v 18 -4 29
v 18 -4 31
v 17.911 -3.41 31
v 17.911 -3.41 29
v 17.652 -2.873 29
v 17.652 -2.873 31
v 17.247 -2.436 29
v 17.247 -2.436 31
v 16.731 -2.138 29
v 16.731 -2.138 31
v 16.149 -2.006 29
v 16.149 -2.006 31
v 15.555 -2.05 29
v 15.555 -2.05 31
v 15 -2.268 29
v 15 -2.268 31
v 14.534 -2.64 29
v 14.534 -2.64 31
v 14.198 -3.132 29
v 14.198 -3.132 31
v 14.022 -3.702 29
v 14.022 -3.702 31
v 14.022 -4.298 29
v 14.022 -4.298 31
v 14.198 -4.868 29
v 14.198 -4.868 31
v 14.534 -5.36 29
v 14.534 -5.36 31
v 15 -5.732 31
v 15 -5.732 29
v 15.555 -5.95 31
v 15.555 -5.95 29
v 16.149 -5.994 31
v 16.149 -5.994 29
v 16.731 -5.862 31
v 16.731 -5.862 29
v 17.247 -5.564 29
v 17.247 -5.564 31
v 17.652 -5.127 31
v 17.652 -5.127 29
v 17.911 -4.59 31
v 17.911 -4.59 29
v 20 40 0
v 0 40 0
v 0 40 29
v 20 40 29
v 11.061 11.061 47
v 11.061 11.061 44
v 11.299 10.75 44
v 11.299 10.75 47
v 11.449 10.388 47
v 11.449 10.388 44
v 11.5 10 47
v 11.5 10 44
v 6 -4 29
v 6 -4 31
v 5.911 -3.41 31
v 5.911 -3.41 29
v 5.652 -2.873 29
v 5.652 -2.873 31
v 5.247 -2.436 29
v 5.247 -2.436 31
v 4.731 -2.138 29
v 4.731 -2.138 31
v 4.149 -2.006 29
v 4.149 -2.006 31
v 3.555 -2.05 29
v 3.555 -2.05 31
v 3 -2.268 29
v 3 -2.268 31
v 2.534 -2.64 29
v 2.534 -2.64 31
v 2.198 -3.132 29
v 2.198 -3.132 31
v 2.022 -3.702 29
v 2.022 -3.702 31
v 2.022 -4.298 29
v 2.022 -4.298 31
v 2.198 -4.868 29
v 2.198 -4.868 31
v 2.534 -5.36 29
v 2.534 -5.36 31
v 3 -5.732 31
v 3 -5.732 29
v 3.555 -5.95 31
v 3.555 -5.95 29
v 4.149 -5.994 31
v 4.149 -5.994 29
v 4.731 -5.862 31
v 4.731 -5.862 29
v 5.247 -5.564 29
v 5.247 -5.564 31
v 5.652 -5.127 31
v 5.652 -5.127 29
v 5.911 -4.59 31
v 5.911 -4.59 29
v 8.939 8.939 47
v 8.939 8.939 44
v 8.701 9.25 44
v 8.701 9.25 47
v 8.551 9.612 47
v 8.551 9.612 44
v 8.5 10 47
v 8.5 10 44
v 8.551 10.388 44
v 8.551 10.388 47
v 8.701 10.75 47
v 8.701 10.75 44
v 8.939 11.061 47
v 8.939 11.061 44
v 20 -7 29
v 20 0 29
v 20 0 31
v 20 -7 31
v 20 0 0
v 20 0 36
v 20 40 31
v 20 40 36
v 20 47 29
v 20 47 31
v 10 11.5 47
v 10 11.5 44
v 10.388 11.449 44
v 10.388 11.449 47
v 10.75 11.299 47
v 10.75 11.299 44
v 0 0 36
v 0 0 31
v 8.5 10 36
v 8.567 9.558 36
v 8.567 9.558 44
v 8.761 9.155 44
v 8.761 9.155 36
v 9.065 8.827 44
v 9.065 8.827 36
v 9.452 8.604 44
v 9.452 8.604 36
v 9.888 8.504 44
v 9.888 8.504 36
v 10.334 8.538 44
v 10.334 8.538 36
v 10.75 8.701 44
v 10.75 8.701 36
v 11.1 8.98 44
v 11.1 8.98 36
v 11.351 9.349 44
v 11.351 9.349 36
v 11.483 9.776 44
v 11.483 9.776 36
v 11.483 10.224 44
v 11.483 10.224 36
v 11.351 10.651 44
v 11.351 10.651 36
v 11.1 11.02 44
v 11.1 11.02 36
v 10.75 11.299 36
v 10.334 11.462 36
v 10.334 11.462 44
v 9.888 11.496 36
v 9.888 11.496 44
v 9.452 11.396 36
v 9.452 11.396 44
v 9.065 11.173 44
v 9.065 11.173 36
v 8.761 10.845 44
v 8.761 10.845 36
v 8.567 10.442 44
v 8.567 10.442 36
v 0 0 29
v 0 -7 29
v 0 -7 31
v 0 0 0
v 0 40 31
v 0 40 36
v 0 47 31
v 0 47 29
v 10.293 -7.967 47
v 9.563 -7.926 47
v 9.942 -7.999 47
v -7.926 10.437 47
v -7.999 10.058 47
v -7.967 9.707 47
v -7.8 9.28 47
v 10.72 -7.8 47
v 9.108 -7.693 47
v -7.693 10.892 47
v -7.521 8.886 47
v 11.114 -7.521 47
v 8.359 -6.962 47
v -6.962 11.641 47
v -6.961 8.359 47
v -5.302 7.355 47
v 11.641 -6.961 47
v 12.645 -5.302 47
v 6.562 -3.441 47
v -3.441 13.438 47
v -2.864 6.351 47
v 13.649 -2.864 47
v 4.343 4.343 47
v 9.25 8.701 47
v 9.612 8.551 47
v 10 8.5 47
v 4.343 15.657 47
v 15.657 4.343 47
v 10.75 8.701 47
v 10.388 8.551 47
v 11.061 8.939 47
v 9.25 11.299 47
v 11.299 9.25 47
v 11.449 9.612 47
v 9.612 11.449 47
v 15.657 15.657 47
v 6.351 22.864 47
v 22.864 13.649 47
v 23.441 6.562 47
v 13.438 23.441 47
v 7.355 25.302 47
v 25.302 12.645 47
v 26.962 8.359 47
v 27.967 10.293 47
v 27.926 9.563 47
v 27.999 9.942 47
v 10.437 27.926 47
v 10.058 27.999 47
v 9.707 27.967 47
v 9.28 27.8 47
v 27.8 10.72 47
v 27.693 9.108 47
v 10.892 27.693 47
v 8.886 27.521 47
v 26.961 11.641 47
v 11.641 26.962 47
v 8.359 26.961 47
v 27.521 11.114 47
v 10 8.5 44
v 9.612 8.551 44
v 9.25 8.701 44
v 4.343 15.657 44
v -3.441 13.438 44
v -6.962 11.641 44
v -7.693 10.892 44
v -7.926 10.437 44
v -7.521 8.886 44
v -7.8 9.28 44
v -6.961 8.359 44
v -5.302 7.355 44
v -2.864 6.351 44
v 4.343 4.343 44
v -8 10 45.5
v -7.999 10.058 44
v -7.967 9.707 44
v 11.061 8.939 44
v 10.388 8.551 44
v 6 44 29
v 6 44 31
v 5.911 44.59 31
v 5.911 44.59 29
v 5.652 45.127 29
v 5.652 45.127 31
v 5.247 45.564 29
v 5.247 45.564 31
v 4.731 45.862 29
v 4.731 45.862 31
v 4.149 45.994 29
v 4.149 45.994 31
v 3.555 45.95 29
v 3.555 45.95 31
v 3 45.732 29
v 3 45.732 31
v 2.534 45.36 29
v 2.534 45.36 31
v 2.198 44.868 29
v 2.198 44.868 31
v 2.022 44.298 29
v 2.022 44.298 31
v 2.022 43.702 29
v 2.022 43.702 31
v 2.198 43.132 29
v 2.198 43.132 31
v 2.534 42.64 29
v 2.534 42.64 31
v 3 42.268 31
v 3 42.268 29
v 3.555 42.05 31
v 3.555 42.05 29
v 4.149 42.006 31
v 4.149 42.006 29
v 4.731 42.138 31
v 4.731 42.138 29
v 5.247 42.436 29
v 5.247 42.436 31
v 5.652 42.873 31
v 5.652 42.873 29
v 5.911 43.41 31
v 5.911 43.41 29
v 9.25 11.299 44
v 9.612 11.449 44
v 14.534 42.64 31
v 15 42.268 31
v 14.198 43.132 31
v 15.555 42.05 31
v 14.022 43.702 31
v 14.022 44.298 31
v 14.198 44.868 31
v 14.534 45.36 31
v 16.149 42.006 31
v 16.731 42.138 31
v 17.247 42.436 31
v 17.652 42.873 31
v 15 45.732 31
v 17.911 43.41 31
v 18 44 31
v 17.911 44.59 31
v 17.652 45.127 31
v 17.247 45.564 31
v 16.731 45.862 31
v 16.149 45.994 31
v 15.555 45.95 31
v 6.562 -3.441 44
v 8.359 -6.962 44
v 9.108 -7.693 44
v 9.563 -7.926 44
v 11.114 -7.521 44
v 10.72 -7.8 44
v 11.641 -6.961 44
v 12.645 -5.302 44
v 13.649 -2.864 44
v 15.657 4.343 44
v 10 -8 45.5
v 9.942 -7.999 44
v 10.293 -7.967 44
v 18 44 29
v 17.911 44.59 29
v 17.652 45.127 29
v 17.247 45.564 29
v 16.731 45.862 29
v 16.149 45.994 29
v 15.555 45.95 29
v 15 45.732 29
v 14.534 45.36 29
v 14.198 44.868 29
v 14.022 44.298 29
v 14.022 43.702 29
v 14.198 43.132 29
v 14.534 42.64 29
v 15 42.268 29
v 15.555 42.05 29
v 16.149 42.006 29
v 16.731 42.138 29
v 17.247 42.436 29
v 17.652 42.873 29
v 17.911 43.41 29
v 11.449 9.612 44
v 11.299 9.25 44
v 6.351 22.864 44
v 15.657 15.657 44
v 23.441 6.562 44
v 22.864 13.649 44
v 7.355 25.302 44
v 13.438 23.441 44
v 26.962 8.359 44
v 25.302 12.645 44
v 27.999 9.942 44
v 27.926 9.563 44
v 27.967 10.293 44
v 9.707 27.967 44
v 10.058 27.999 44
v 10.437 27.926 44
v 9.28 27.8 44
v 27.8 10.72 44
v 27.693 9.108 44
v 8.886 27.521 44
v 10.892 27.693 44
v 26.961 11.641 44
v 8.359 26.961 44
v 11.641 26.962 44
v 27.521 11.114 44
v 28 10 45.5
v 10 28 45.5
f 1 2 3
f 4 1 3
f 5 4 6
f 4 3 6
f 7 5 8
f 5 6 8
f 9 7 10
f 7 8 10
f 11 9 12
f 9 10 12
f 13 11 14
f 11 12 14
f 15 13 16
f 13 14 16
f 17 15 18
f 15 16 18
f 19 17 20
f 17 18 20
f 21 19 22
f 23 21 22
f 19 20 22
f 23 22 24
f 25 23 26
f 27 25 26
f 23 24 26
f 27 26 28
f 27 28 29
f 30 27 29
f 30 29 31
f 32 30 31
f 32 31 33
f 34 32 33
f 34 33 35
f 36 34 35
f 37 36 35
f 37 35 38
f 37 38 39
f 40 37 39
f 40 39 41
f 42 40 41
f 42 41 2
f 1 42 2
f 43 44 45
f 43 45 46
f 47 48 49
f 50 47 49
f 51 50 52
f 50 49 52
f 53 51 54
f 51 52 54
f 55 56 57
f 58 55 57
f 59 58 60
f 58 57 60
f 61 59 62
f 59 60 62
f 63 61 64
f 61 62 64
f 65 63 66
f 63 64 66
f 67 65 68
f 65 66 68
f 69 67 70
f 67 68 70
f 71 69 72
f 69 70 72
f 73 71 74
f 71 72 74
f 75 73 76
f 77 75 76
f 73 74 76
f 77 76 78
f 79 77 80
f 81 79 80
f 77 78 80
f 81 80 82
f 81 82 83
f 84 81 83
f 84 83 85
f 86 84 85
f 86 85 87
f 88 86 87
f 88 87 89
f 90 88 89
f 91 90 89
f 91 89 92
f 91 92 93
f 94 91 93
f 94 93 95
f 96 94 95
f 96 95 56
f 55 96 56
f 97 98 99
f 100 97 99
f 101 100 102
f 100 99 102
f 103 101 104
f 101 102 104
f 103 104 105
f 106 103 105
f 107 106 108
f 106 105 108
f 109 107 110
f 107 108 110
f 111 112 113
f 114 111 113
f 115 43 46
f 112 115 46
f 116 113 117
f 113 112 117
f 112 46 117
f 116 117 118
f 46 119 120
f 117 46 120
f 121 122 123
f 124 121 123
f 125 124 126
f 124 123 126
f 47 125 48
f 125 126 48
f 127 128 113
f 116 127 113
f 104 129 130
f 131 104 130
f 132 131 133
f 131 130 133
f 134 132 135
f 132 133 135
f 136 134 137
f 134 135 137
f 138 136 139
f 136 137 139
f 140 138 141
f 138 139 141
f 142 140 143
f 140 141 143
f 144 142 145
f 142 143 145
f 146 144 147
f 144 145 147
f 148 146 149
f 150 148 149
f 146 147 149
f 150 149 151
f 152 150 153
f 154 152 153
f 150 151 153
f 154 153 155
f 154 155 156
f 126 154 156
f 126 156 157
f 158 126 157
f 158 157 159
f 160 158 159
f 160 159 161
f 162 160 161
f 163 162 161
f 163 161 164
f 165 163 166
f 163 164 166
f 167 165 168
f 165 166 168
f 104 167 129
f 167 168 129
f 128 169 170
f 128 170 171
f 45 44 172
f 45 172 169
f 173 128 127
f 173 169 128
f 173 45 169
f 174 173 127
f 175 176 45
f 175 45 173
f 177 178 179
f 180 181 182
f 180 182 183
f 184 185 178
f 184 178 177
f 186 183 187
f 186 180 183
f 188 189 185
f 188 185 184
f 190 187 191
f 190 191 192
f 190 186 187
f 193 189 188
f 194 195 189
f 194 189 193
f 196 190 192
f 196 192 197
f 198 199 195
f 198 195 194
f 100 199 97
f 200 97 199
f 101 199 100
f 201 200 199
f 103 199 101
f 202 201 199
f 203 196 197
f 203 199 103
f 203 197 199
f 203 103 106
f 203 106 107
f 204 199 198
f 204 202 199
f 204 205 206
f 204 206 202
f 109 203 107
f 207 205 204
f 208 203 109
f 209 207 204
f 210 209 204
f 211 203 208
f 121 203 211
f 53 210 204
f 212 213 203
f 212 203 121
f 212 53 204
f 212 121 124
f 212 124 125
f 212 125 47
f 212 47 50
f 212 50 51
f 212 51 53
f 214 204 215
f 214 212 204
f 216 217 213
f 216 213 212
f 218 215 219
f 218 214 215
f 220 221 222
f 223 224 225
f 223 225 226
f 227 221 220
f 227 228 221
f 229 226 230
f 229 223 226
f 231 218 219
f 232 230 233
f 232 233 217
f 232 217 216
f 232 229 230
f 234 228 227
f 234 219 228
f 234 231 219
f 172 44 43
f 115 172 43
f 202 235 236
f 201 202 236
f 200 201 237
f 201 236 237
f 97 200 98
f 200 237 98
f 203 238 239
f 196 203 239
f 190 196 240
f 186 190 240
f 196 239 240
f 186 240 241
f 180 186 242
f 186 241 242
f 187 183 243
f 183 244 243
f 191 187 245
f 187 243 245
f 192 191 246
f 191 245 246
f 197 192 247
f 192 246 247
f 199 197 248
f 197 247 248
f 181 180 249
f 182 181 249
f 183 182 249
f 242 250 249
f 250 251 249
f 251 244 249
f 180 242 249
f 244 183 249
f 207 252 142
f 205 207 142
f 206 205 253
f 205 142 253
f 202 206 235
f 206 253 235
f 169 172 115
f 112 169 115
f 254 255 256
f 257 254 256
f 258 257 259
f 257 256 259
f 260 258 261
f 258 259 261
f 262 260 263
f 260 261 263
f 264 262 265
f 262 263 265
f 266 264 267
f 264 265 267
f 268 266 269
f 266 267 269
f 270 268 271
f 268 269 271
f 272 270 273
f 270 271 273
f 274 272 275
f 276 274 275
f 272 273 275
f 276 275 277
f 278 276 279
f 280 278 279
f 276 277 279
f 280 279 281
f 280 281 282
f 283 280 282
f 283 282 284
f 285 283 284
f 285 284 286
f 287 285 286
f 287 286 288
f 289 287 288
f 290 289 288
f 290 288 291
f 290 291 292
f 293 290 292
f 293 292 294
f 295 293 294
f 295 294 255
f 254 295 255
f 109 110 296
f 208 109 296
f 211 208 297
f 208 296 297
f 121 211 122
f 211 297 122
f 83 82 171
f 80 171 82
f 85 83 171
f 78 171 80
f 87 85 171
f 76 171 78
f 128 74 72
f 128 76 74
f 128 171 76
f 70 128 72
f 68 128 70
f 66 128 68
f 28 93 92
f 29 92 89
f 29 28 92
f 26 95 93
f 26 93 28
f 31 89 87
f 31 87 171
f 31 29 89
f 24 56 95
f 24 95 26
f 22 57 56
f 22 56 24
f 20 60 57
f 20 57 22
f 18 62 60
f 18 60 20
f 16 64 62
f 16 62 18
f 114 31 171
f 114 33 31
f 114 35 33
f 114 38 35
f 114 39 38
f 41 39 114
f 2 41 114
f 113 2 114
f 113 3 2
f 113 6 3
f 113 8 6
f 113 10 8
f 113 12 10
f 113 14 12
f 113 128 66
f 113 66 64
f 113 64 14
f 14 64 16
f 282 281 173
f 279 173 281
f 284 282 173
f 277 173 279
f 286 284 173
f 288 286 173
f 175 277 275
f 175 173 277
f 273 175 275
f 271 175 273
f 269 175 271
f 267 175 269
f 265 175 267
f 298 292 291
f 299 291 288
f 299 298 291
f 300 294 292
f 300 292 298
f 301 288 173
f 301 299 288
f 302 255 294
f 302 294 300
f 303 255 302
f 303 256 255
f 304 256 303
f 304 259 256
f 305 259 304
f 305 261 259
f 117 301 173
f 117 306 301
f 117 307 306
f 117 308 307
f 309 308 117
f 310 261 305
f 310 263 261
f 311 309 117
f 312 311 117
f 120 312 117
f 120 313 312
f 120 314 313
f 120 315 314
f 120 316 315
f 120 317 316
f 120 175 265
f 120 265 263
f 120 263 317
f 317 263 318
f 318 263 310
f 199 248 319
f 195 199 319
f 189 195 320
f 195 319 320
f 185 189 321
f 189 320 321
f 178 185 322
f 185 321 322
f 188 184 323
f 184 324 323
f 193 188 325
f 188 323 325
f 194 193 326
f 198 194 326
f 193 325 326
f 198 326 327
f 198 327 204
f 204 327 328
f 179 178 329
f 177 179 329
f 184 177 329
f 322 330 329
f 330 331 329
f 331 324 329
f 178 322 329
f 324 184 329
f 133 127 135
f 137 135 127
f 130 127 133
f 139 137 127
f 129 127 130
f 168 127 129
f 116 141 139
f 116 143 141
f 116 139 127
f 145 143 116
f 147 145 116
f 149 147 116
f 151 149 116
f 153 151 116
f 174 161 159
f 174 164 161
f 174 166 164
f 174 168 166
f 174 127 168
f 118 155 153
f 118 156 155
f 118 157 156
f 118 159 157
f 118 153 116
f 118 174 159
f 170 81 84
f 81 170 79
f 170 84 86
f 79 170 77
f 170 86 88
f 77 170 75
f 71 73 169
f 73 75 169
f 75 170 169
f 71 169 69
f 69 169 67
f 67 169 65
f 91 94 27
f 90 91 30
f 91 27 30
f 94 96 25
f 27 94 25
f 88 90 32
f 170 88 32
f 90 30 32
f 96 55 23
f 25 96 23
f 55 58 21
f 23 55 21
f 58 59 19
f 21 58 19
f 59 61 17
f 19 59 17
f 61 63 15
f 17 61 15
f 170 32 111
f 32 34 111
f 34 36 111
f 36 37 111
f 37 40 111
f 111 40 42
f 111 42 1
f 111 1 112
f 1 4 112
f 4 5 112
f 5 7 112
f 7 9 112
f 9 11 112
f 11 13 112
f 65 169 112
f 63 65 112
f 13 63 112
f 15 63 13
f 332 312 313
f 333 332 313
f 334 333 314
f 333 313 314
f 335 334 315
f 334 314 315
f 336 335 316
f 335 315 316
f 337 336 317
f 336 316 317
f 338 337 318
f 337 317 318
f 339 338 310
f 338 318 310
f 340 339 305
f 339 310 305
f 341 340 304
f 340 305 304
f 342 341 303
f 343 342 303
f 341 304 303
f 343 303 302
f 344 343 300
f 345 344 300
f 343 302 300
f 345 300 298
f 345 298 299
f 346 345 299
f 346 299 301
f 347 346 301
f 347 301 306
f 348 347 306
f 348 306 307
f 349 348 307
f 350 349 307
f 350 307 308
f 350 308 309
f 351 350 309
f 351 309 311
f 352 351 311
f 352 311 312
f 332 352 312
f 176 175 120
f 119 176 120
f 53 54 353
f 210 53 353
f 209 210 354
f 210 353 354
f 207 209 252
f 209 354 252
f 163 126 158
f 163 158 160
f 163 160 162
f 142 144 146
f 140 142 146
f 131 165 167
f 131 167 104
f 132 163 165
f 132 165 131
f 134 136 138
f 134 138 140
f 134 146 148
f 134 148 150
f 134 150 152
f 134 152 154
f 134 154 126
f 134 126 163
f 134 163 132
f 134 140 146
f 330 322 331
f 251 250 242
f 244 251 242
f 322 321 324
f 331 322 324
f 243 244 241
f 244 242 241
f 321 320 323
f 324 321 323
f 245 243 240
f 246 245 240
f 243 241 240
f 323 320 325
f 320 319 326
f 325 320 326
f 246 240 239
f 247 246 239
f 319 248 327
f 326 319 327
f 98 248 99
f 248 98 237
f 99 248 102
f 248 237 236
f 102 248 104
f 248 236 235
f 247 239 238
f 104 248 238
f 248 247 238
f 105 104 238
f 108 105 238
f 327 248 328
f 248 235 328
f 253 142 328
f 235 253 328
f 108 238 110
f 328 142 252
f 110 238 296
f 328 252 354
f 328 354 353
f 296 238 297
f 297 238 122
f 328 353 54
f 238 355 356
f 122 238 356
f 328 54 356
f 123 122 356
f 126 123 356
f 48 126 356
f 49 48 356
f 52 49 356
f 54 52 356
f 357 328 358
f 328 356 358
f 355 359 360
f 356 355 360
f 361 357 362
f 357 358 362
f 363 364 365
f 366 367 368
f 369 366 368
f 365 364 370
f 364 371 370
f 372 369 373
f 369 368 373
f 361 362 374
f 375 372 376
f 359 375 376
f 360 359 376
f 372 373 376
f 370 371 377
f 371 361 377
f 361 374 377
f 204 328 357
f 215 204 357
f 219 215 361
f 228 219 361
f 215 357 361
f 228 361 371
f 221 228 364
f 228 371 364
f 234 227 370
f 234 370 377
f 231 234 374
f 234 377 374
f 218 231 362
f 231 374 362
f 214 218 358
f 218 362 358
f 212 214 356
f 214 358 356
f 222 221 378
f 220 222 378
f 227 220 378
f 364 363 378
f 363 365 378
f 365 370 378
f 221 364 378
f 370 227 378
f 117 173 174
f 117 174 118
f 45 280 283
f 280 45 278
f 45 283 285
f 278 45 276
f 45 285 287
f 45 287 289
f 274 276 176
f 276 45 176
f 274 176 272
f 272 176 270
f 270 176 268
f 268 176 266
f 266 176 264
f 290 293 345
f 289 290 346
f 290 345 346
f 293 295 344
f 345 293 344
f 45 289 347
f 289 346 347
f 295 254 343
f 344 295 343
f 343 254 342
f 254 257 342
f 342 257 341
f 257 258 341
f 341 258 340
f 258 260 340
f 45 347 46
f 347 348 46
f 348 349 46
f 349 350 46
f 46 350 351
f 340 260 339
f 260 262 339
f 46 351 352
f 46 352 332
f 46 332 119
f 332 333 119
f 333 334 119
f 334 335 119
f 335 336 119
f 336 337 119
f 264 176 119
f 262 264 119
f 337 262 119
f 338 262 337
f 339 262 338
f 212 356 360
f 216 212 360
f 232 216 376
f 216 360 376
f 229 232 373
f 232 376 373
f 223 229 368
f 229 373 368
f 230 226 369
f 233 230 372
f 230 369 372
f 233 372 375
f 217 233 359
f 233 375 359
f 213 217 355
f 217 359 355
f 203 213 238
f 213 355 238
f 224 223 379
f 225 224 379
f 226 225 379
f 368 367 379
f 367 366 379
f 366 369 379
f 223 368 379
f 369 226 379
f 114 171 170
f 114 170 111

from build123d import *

# Parameters (mm, degrees)
SKETCH_1_W           = 20
SKETCH_1_H           = 40
EXTRUDE_1_DEPTH      = 36
EXTRUDE_2_DEPTH      = 7
EXTRUDE_2_DEPTH_BACK = 47
SKETCH_2_W           = 20
SKETCH_2_H           = 2
CUT_EXTRUDE_1_REACH  = 61.749
SKETCH_3_R           = 2
SKETCH_4_R           = 1.5
EXTRUDE_3_DEPTH      = 8
EXTRUDE_4_DEPTH      = 3


with BuildPart() as part:
    # 草图1 → 凸台-拉伸1 (new body)
    with BuildSketch(Plane.XY):
        with Locations((10, 20)):
            Rectangle(SKETCH_1_W, SKETCH_1_H)
    extrude(amount=EXTRUDE_1_DEPTH)

    # 草图2 → 凸台-拉伸2 (add, two sides: drawn at the far end of the back side and taken through both)
    with BuildSketch(Plane.XZ.offset(-EXTRUDE_2_DEPTH_BACK)):
        with Locations((10, 30)):
            Rectangle(SKETCH_2_W, SKETCH_2_H)
    extrude(amount=EXTRUDE_2_DEPTH + EXTRUDE_2_DEPTH_BACK)

    # 草图3 → 切除-拉伸1 (cut, up to next)
    with BuildSketch(Plane.XY.offset(31), mode=Mode.PRIVATE) as cut_extrude_1_sk1:
        with Locations((4, -4)):
            Circle(SKETCH_3_R)
    cut_extrude_1_tool1 = extrude(cut_extrude_1_sk1.sketch, amount=-CUT_EXTRUDE_1_REACH, mode=Mode.PRIVATE) & part.part
    # 草图3 → 切除-拉伸1 (cut, up to next)
    with BuildSketch(Plane.XY.offset(31), mode=Mode.PRIVATE) as cut_extrude_1_sk2:
        with Locations((16, -4)):
            Circle(SKETCH_3_R)
    cut_extrude_1_tool2 = extrude(cut_extrude_1_sk2.sketch, amount=-CUT_EXTRUDE_1_REACH, mode=Mode.PRIVATE) & part.part
    # 草图3 → 切除-拉伸1 (cut, up to next)
    with BuildSketch(Plane.XY.offset(31), mode=Mode.PRIVATE) as cut_extrude_1_sk3:
        with Locations((4, 44)):
            Circle(SKETCH_3_R)
    cut_extrude_1_tool3 = extrude(cut_extrude_1_sk3.sketch, amount=-CUT_EXTRUDE_1_REACH, mode=Mode.PRIVATE) & part.part
    # 草图3 → 切除-拉伸1 (cut, up to next)
    with BuildSketch(Plane.XY.offset(31), mode=Mode.PRIVATE) as cut_extrude_1_sk4:
        with Locations((16, 44)):
            Circle(SKETCH_3_R)
    cut_extrude_1_tool4 = extrude(cut_extrude_1_sk4.sketch, amount=-CUT_EXTRUDE_1_REACH, mode=Mode.PRIVATE) & part.part
    add(cut_extrude_1_tool1.solids().sort_by_distance((4, -4, 31))[0], mode=Mode.SUBTRACT)
    add(cut_extrude_1_tool2.solids().sort_by_distance((16, -4, 31))[0], mode=Mode.SUBTRACT)
    add(cut_extrude_1_tool3.solids().sort_by_distance((4, 44, 31))[0], mode=Mode.SUBTRACT)
    add(cut_extrude_1_tool4.solids().sort_by_distance((16, 44, 31))[0], mode=Mode.SUBTRACT)

    # 草图4 → 凸台-拉伸3 (add)
    with BuildSketch(Plane.XY.offset(36)):
        with Locations(Location((10, 10, 0), (0, 0, 180))):
            Circle(SKETCH_4_R)
    extrude(amount=EXTRUDE_3_DEPTH)


with BuildPart() as body_2:
    # 草图5 → 凸台-拉伸4 (new body)
    with BuildSketch(Plane.XY.offset(44)):
        with BuildLine():
            add(Edge.make_bspline(
                [(10, -8), (12.828427125, -8), (15.656854249, 4.343145751)],
                knots=[0.5, 0.5, 0.5, 1, 1, 1], degree=2))
            ThreePointArc((15.656854249, 4.343145751), (13.061467459, 2.60896374), (10, 2))
            Line((10, 2), (10, -8))
        make_face()
        with BuildLine():
            Line((10, -8), (10, 2))
            ThreePointArc((10, 2), (6.938532541, 2.60896374), (4.343145751, 4.343145751))
            add(Edge.make_bspline(
                [(4.343145751, 4.343145751), (7.171572875, -8), (10, -8)],
                knots=[0, 0, 0, 0.5, 0.5, 0.5], degree=2))
        make_face()
        with BuildLine():
            Line((18, 10), (11.5, 10))
            ThreePointArc((11.5, 10), (11.385819299, 9.425974851), (11.060660172, 8.939339828))
            Line((11.060660172, 8.939339828), (15.656854249, 4.343145751))
            ThreePointArc((15.656854249, 4.343145751), (17.39103626, 6.938532541), (18, 10))
        make_face()
        with BuildLine():
            add(Edge.make_bspline(
                [(28, 10), (28, 12.828427125), (15.656854249, 15.656854249)],
                knots=[0.5, 0.5, 0.5, 1, 1, 1], degree=2))
            ThreePointArc((15.656854249, 15.656854249), (17.39103626, 13.061467459), (18, 10))
            Line((18, 10), (28, 10))
        make_face()
        with BuildLine():
            Line((28, 10), (18, 10))
            ThreePointArc((18, 10), (17.39103626, 6.938532541), (15.656854249, 4.343145751))
            add(Edge.make_bspline(
                [(15.656854249, 4.343145751), (28, 7.171572875), (28, 10)],
                knots=[0, 0, 0, 0.5, 0.5, 0.5], degree=2))
        make_face()
        with BuildLine():
            Line((15.656854249, 15.656854249), (11.060660172, 11.060660172))
            ThreePointArc((11.060660172, 11.060660172), (11.385819299, 10.574025149), (11.5, 10))
            Line((11.5, 10), (18, 10))
            ThreePointArc((18, 10), (17.39103626, 13.061467459), (15.656854249, 15.656854249))
        make_face()
        with BuildLine():
            Line((10, 18), (10, 11.5))
            ThreePointArc((10, 11.5), (10.574025149, 11.385819299), (11.060660172, 11.060660172))
            Line((11.060660172, 11.060660172), (15.656854249, 15.656854249))
            ThreePointArc((15.656854249, 15.656854249), (13.061467459, 17.39103626), (10, 18))
        make_face()
        with BuildLine():
            add(Edge.make_bspline(
                [(4.343145751, 15.656854249), (7.171572875, 28), (10, 28)],
                knots=[0, 0, 0, 0.5, 0.5, 0.5], degree=2))
            ThreePointArc((4.343145751, 15.656854249), (6.938532541, 17.39103626), (10, 18))
            Line((10, 18), (10, 28))
        make_face()
        with BuildLine():
            Line((10, 28), (10, 18))
            ThreePointArc((10, 18), (13.061467459, 17.39103626), (15.656854249, 15.656854249))
            add(Edge.make_bspline(
                [(10, 28), (12.828427125, 28), (15.656854249, 15.656854249)],
                knots=[0.5, 0.5, 0.5, 1, 1, 1], degree=2))
        make_face()
        with BuildLine():
            Line((4.343145751, 15.656854249), (8.939339828, 11.060660172))
            ThreePointArc((8.939339828, 11.060660172), (9.425974851, 11.385819299), (10, 11.5))
            Line((10, 11.5), (10, 18))
            ThreePointArc((10, 18), (6.938532541, 17.39103626), (4.343145751, 15.656854249))
        make_face()
        with BuildLine():
            Line((2, 10), (8.5, 10))
            ThreePointArc((8.5, 10), (8.614180701, 10.574025149), (8.939339828, 11.060660172))
            Line((8.939339828, 11.060660172), (4.343145751, 15.656854249))
            ThreePointArc((4.343145751, 15.656854249), (2.60896374, 13.061467459), (2, 10))
        make_face()
        with BuildLine():
            ThreePointArc((4.343145751, 4.343145751), (2.60896374, 6.938532541), (2, 10))
            Line((2, 10), (-8, 10))
            add(Edge.make_bspline(
                [(4.343145751, 4.343145751), (-8, 7.171572875), (-8, 10)],
                knots=[0, 0, 0, 0.5, 0.5, 0.5], degree=2))
        make_face()
        with BuildLine():
            Line((-8, 10), (2, 10))
            ThreePointArc((2, 10), (2.60896374, 13.061467459), (4.343145751, 15.656854249))
            add(Edge.make_bspline(
                [(-8, 10), (-8, 12.828427125), (4.343145751, 15.656854249)],
                knots=[0.5, 0.5, 0.5, 1, 1, 1], degree=2))
        make_face()
        with BuildLine():
            ThreePointArc((8.939339828, 8.939339828), (8.614180701, 9.425974851), (8.5, 10))
            Line((8.5, 10), (2, 10))
            ThreePointArc((2, 10), (2.60896374, 6.938532541), (4.343145751, 4.343145751))
            Line((4.343145751, 4.343145751), (8.939339828, 8.939339828))
        make_face()
        with BuildLine():
            Line((10, 2), (10, 8.5))
            ThreePointArc((10, 8.5), (9.425974851, 8.614180701), (8.939339828, 8.939339828))
            Line((8.939339828, 8.939339828), (4.343145751, 4.343145751))
            ThreePointArc((4.343145751, 4.343145751), (6.938532541, 2.60896374), (10, 2))
        make_face()
        with BuildLine():
            Line((15.656854249, 4.343145751), (11.060660172, 8.939339828))
            ThreePointArc((11.060660172, 8.939339828), (10.574025149, 8.614180701), (10, 8.5))
            Line((10, 8.5), (10, 2))
            ThreePointArc((10, 2), (13.061467459, 2.60896374), (15.656854249, 4.343145751))
        make_face()
    extrude(amount=EXTRUDE_4_DEPTH)


solid = Compound([part.part, body_2.part])
